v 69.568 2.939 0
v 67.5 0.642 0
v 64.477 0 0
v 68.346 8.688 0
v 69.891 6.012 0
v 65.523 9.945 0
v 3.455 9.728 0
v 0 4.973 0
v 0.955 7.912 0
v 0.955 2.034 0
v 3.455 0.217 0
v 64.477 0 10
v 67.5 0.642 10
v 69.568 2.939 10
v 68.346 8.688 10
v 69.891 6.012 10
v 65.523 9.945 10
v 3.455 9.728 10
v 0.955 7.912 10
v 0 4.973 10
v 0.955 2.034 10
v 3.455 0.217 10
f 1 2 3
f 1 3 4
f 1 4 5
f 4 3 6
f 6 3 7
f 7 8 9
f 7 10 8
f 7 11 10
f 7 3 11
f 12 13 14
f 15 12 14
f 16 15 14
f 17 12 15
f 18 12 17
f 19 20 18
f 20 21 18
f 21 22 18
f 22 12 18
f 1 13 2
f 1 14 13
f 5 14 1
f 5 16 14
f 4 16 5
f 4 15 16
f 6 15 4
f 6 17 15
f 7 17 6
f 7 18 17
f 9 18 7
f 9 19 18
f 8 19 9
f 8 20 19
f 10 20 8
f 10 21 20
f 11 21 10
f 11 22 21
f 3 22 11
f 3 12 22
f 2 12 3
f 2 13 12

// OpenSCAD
$fn = 32;

// ----------------------------------------------------------------------
// Key bar: parallel key, 10 mm thick
// ----------------------------------------------------------------------

// --- parameters (mm) ---
profile_height = 10;      // extrusion height
profile_points = 11;      // points of the closed outline

profile = [[0, 4.973], [0.955, 2.034], [3.455, 0.217], [64.477, 0], [67.5, 0.642], [69.568, 2.939], [69.891, 6.012], [68.346, 8.688], [65.523, 9.945], [3.455, 9.728], [0.955, 7.912]];  // single closed polygon, 11 points, counter clockwise

// --- the one profile operation ---
linear_extrude(height = profile_height) polygon(points = profile);
